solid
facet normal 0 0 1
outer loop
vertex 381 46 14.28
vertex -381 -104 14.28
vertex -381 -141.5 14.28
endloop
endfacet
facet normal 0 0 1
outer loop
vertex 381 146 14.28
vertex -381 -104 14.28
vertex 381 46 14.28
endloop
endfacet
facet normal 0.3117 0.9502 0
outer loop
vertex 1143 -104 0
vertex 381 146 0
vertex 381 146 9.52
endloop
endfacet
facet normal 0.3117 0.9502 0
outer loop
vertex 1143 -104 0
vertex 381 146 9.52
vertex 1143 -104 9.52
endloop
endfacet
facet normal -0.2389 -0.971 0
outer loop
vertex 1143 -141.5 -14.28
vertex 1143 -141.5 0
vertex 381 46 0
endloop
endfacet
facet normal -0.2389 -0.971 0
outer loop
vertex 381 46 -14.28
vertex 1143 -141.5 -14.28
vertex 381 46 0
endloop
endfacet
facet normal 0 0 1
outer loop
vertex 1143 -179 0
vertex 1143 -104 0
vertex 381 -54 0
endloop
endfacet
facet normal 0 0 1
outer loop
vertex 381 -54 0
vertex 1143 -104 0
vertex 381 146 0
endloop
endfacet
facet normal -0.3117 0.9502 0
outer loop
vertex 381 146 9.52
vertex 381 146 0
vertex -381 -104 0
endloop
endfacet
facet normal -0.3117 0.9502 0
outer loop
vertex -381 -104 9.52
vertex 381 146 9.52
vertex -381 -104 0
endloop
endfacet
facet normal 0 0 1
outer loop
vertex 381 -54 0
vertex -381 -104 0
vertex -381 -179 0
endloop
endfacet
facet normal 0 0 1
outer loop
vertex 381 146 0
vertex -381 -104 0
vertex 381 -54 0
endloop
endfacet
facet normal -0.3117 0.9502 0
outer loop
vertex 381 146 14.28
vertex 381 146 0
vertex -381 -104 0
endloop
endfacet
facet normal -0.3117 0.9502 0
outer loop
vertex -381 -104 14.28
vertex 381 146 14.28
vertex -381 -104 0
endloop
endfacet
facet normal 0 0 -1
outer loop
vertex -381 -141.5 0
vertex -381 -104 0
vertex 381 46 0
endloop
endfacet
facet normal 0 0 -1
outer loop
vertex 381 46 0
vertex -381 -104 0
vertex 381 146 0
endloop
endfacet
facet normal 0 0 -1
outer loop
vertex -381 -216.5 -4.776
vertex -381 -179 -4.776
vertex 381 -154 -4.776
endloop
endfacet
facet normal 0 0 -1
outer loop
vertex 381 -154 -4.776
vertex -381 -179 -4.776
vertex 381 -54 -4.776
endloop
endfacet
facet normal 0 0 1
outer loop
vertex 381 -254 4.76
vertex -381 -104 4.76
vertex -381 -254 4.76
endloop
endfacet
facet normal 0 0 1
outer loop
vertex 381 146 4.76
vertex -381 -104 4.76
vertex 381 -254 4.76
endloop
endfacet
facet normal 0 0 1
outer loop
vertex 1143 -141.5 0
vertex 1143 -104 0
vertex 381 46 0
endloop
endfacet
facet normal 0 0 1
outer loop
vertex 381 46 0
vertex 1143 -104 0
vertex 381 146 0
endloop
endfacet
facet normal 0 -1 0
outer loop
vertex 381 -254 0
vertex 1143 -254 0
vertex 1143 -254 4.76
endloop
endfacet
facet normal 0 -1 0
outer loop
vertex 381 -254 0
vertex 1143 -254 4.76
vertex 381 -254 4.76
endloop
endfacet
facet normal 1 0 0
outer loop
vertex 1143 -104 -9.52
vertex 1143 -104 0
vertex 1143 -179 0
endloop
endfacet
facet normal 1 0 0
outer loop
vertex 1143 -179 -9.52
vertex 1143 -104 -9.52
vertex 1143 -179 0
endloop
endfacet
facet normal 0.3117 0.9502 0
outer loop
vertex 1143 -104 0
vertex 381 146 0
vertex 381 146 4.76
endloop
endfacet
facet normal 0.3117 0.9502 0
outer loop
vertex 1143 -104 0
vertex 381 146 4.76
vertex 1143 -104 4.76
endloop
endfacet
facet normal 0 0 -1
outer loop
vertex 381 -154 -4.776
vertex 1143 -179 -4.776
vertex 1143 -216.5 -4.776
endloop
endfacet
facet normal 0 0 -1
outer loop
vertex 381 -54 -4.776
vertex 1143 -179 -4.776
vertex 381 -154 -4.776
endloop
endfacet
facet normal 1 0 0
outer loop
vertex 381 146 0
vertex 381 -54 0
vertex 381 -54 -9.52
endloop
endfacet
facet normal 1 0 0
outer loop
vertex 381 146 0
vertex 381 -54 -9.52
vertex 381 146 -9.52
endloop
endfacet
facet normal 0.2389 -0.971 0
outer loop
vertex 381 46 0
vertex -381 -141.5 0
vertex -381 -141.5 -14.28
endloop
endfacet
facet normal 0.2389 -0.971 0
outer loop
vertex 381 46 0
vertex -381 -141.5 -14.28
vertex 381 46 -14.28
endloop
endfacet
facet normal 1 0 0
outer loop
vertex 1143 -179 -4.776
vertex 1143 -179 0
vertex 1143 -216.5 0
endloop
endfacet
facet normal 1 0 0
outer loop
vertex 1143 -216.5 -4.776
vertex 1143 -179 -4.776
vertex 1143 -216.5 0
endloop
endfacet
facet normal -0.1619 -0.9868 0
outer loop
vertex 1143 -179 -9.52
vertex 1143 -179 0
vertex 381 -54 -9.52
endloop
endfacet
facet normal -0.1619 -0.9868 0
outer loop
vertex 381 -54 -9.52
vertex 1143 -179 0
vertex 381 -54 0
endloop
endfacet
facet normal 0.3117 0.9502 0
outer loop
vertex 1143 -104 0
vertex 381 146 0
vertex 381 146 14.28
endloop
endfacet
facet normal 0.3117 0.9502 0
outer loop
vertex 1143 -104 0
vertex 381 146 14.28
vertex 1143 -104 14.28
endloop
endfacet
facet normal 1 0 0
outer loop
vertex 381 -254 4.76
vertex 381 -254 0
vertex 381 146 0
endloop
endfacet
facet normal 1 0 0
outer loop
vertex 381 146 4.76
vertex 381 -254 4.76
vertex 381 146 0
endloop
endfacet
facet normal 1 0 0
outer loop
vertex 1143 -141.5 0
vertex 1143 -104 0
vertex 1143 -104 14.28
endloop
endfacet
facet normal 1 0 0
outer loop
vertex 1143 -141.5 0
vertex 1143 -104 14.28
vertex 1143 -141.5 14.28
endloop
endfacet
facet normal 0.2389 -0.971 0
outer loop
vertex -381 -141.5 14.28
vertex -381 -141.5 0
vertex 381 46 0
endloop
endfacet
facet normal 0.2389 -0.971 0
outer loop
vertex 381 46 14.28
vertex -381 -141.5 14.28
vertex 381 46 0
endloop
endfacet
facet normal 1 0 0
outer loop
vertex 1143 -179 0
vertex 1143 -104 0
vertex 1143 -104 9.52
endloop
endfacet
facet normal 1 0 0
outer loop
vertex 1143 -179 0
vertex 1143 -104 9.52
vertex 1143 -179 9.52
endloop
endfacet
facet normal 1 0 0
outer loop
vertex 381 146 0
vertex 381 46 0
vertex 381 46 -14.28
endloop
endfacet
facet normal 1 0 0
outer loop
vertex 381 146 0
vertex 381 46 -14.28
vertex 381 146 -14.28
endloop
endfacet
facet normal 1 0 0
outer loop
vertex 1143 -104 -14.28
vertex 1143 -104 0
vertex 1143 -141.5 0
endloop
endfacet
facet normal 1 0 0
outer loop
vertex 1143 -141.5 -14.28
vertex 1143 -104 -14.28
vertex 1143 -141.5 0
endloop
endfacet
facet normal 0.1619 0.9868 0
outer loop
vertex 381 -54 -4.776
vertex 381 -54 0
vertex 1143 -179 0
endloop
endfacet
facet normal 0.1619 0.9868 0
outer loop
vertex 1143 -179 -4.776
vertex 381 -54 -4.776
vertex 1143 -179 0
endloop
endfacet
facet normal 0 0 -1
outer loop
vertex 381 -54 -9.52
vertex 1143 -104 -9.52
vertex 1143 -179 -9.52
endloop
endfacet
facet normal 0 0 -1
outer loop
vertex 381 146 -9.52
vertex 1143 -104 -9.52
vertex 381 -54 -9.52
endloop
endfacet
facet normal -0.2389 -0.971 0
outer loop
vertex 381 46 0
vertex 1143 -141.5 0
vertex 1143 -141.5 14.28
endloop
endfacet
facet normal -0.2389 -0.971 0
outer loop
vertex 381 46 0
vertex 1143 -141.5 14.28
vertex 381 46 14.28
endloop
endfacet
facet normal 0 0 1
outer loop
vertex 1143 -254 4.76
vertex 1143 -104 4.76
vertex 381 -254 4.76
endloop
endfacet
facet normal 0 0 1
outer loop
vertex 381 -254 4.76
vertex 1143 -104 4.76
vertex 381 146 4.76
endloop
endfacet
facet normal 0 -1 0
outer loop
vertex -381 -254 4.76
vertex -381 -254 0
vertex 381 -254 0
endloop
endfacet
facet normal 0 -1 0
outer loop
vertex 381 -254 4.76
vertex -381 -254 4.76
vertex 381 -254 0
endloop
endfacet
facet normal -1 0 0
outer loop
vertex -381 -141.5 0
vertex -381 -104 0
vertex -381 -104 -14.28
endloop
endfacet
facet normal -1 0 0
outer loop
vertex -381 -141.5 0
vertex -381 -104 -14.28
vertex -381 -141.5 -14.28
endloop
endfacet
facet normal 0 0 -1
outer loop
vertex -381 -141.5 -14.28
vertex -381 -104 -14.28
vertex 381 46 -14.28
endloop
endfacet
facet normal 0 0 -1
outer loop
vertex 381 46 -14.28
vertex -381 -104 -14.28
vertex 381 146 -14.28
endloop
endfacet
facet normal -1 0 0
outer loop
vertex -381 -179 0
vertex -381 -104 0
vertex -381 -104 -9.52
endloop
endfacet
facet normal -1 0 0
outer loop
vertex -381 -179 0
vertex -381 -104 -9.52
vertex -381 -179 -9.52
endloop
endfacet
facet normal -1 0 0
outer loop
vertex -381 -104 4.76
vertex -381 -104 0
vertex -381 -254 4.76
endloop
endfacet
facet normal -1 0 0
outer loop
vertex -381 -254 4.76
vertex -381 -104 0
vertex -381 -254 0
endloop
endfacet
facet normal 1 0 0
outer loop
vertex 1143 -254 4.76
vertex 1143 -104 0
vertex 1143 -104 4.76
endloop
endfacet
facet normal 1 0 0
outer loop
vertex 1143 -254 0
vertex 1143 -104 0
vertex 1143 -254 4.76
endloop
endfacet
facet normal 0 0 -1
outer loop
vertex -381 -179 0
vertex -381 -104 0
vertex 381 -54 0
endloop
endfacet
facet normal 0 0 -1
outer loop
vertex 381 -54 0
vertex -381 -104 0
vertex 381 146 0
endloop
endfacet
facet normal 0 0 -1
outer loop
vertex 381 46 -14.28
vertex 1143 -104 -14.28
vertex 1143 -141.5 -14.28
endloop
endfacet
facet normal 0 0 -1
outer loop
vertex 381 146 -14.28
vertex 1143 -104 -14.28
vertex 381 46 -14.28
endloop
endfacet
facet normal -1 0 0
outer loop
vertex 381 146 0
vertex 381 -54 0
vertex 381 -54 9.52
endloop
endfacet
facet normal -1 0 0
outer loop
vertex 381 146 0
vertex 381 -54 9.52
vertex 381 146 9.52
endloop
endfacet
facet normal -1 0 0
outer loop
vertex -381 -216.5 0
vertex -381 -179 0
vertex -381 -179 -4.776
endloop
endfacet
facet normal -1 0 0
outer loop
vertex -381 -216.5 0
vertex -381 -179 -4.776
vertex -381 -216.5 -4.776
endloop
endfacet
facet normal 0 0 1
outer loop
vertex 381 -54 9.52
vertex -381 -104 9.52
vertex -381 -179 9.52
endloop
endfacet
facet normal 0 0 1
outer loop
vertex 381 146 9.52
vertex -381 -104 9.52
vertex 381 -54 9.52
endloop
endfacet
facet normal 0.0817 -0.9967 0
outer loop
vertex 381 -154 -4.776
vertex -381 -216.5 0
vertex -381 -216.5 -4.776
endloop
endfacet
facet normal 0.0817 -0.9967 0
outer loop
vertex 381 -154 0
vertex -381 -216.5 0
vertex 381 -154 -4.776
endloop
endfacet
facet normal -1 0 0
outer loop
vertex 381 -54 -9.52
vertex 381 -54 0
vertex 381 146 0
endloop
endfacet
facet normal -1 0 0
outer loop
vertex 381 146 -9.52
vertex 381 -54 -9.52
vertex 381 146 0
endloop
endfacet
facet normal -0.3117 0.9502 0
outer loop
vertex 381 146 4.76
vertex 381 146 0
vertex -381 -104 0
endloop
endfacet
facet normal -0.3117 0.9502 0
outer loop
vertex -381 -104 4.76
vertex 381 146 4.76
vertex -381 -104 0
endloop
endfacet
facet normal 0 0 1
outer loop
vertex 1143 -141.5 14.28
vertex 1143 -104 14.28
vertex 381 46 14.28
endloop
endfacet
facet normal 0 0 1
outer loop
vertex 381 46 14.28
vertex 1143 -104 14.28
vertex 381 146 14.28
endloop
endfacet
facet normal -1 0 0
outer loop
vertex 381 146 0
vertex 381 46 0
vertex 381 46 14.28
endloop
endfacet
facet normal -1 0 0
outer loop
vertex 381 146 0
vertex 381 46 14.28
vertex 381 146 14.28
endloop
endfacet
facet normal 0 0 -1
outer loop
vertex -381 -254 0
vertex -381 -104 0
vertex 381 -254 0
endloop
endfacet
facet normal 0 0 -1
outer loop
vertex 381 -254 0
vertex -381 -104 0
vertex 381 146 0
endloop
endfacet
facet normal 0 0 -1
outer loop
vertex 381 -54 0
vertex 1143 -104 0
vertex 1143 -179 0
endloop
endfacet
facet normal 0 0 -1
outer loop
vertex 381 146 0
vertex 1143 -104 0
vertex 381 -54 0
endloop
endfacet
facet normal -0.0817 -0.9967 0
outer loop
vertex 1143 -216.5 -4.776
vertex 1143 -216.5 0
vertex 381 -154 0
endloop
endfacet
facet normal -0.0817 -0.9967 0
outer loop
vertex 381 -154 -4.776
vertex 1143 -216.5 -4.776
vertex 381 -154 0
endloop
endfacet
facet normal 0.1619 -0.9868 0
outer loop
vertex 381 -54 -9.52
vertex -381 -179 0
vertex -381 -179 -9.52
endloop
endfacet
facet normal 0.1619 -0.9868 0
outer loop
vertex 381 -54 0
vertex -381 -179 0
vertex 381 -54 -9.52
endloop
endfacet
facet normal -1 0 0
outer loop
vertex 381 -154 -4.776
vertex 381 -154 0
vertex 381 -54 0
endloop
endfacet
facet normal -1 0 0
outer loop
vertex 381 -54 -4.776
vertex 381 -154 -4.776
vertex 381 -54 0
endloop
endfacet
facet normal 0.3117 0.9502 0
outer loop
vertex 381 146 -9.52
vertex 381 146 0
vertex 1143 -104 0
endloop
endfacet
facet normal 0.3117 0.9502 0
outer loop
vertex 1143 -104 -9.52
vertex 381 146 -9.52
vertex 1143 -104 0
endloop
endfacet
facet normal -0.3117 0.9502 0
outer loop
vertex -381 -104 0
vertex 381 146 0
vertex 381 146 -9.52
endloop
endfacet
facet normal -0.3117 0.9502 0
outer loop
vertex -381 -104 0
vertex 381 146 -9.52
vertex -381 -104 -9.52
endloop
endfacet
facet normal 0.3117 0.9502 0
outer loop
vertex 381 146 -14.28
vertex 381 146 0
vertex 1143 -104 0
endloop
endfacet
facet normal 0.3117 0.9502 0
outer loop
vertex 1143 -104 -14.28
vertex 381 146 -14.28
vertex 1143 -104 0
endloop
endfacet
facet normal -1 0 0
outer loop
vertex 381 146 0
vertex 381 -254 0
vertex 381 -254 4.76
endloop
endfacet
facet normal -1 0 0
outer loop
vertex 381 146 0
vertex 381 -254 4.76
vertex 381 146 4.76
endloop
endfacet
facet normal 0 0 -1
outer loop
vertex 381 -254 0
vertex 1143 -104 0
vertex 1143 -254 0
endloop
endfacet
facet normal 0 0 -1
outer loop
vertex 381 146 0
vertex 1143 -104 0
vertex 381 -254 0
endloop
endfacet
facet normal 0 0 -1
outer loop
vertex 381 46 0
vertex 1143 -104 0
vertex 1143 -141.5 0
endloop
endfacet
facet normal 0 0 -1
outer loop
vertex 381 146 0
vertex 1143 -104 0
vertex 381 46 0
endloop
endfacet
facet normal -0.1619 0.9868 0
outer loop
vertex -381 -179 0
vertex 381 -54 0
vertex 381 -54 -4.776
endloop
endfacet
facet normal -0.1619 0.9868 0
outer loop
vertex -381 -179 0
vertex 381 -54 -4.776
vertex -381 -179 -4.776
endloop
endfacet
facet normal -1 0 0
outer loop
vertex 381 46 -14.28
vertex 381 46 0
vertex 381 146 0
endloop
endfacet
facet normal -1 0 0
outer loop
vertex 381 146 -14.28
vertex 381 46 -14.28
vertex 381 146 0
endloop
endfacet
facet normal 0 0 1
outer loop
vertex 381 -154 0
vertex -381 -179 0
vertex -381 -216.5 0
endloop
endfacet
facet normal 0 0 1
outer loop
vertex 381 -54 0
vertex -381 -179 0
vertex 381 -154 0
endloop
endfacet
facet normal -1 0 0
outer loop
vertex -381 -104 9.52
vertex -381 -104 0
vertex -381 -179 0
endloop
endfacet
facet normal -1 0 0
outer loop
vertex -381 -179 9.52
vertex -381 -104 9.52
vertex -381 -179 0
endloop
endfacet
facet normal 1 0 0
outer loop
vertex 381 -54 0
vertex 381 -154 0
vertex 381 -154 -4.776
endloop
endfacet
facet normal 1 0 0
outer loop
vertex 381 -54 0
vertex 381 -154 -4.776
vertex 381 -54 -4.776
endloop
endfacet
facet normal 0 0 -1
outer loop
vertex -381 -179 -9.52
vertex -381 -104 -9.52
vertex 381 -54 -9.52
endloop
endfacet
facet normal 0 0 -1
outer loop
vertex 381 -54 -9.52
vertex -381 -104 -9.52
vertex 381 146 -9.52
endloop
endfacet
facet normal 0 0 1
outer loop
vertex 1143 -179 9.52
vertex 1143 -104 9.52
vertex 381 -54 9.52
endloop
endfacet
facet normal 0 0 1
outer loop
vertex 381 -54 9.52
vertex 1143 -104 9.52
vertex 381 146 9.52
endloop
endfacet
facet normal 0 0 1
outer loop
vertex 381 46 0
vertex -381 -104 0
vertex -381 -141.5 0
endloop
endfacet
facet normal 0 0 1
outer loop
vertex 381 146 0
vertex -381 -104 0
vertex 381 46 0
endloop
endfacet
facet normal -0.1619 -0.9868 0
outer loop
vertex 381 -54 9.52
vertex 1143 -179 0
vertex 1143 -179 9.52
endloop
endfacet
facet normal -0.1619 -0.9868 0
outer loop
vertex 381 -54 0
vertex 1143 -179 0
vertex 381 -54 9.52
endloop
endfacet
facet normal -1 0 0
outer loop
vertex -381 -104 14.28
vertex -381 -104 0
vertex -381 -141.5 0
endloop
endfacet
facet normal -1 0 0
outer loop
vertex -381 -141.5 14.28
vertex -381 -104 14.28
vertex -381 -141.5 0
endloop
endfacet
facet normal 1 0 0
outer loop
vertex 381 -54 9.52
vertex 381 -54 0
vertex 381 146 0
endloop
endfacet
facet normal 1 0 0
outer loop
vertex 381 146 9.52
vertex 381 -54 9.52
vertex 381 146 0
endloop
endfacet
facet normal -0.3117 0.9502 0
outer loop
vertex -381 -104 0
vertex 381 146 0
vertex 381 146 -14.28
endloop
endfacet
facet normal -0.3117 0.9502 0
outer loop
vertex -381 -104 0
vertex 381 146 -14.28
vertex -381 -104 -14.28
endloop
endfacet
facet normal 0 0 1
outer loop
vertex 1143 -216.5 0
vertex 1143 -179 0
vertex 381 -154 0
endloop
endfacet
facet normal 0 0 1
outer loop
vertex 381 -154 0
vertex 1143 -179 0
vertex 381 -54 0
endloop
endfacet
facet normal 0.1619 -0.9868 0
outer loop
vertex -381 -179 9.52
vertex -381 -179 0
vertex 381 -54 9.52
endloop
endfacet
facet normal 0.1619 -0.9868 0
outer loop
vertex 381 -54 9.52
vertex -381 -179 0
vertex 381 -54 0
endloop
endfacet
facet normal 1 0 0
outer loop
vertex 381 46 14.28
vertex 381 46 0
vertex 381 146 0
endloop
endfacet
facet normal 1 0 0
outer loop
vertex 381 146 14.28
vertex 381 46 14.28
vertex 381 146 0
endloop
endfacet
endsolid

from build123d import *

# Parameters (mm, degrees)
F1_DEPTH = 4.76
F2_DEPTH = 9.52
F3_DEPTH = 14.28
F4_DEPTH = 9.52
F5_DEPTH = 14.28
F6_DEPTH = 4.776


with BuildPart() as f1:
    # F0 (on Top) → F1 (new body)
    with BuildSketch(Plane.XY):
        Polygon((381, -54), (-381, -179), (-381, -216.5), (381, -154), align=None)
        Polygon((381, 46), (-381, -141.5), (-381, -179), (381, -54), align=None)
        Polygon((381, 146), (-381, -104), (-381, -141.5), (381, 46), align=None)
        Polygon((381, -154), (-381, -216.5), (-381, -254), (381, -254), align=None)
    extrude(amount=F1_DEPTH)


with BuildPart() as f2:
    # F0 (on Top) → F2 (new body)
    with BuildSketch(Plane.XY):
        Polygon((381, 46), (-381, -141.5), (-381, -179), (381, -54), align=None)
        Polygon((381, 146), (-381, -104), (-381, -141.5), (381, 46), align=None)
    extrude(amount=F2_DEPTH)


with BuildPart() as f3:
    # F0 (on Top) → F3 (new body)
    with BuildSketch(Plane.XY):
        Polygon((381, 146), (-381, -104), (-381, -141.5), (381, 46), align=None)
    extrude(amount=F3_DEPTH)


with BuildPart() as f4:
    # F0 (on Top) → F4 (new body)
    with BuildSketch(Plane.XY):
        Polygon((381, 46), (-381, -141.5), (-381, -179), (381, -54), align=None)
        Polygon((381, 146), (-381, -104), (-381, -141.5), (381, 46), align=None)
    extrude(amount=-F4_DEPTH)


with BuildPart() as f5:
    # F0 (on Top) → F5 (new body)
    with BuildSketch(Plane.XY):
        Polygon((381, 146), (-381, -104), (-381, -141.5), (381, 46), align=None)
    extrude(amount=-F5_DEPTH)


with BuildPart() as f6:
    # F0 (on Top) → F6 (new body)
    with BuildSketch(Plane.XY):
        Polygon((381, -54), (-381, -179), (-381, -216.5), (381, -154), align=None)
    extrude(amount=-F6_DEPTH)


with BuildPart() as f7_1:
    # F7: instance of F1
    add(f1.part.mirror(Plane(origin=(381, -54, 2.38), x_dir=(0, 1, 0), z_dir=(1, 0, 0))))


with BuildPart() as f7_2:
    # F7: instance of F2
    add(f2.part.mirror(Plane(origin=(381, -54, 2.38), x_dir=(0, 1, 0), z_dir=(1, 0, 0))))


with BuildPart() as f7_3:
    # F7: instance of F3
    add(f3.part.mirror(Plane(origin=(381, -54, 2.38), x_dir=(0, 1, 0), z_dir=(1, 0, 0))))


with BuildPart() as f7_4:
    # F7: instance of F4
    add(f4.part.mirror(Plane(origin=(381, -54, 2.38), x_dir=(0, 1, 0), z_dir=(1, 0, 0))))


with BuildPart() as f7_5:
    # F7: instance of F5
    add(f5.part.mirror(Plane(origin=(381, -54, 2.38), x_dir=(0, 1, 0), z_dir=(1, 0, 0))))


with BuildPart() as f7_6:
    # F7: instance of F6
    add(f6.part.mirror(Plane(origin=(381, -54, 2.38), x_dir=(0, 1, 0), z_dir=(1, 0, 0))))


solid = Compound([f1.part, f2.part, f3.part, f4.part, f5.part, f6.part, f7_1.part, f7_2.part, f7_3.part, f7_4.part, f7_5.part, f7_6.part])
